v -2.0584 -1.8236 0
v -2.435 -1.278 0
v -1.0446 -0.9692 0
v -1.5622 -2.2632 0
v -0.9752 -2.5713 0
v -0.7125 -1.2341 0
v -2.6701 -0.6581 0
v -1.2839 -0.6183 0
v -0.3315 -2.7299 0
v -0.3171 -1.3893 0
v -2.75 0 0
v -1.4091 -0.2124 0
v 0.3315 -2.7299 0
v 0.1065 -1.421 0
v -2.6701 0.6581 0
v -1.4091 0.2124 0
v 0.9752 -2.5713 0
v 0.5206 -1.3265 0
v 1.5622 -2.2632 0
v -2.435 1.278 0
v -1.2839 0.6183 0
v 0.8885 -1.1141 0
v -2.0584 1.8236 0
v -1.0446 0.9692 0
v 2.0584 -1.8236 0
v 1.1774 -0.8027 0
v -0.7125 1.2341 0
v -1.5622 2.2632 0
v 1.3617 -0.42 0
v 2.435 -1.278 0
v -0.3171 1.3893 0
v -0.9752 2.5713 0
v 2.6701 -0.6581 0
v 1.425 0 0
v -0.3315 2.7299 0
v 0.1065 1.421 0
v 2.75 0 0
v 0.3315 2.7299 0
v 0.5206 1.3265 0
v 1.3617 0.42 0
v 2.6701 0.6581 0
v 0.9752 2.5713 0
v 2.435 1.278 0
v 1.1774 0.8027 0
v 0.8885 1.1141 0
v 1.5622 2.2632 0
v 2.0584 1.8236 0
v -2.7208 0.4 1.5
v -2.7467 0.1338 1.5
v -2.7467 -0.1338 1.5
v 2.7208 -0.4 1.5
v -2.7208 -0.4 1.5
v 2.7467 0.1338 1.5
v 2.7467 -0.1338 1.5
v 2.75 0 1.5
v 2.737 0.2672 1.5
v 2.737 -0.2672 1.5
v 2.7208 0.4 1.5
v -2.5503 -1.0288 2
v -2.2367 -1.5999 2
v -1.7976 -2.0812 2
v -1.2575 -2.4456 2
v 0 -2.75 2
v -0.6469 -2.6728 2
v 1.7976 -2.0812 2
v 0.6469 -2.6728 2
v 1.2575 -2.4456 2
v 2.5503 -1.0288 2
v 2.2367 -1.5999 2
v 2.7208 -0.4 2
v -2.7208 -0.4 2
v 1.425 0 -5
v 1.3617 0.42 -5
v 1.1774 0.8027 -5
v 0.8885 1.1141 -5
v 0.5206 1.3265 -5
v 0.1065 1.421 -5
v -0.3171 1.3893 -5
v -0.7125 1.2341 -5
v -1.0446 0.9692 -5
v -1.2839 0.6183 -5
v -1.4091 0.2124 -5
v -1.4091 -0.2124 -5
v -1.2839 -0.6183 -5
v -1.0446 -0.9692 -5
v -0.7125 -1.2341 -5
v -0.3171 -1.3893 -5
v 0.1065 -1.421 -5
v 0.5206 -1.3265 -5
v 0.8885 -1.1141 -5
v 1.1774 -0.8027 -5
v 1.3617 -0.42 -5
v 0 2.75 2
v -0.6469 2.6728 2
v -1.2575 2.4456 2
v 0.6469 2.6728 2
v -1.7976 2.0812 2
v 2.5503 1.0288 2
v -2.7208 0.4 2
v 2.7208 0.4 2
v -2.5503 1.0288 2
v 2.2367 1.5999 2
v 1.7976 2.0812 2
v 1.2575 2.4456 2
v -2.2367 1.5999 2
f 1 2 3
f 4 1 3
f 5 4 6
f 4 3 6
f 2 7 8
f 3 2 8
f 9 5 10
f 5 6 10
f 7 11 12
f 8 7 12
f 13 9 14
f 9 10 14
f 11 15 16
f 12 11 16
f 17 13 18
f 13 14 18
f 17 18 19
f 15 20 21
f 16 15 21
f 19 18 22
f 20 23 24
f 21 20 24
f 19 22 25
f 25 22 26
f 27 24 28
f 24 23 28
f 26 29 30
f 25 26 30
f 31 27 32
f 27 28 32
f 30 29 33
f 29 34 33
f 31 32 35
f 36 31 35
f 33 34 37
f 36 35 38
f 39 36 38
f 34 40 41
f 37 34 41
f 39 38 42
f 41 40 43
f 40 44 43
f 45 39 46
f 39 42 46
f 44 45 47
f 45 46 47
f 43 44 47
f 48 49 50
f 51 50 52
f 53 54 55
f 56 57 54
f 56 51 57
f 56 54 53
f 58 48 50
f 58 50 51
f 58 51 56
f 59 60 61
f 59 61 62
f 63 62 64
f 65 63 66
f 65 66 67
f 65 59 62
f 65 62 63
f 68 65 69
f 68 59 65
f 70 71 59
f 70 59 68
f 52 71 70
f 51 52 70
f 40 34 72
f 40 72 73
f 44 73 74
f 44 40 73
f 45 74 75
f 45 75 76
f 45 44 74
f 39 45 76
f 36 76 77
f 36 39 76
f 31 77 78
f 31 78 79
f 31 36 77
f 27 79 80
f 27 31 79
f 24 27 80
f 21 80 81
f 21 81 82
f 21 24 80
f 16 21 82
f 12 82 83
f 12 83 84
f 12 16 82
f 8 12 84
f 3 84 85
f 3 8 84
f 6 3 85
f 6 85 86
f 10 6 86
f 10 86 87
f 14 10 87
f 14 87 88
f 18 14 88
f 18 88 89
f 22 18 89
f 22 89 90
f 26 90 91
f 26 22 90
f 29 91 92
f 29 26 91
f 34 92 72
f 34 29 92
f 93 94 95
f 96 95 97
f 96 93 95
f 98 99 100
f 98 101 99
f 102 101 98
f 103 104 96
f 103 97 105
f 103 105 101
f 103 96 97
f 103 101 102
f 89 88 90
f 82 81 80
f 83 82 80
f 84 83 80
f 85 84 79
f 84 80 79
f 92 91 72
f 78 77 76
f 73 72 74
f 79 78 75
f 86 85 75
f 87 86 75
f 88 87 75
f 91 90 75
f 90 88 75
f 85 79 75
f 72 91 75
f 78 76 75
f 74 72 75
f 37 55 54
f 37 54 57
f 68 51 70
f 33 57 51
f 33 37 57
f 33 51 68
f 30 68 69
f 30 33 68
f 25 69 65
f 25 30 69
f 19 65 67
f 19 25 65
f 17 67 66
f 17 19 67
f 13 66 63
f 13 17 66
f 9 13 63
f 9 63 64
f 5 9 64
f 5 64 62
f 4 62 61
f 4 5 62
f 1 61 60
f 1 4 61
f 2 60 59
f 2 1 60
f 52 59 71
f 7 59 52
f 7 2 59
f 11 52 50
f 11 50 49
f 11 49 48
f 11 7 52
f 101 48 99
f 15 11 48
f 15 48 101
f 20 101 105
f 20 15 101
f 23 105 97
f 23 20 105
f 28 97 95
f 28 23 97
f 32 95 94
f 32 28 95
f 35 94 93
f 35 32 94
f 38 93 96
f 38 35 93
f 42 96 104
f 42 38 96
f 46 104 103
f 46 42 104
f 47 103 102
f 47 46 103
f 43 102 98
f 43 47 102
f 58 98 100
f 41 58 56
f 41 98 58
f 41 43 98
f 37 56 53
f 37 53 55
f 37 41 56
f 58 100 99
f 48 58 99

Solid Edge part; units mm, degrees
sketch "Sketch1" plane through (0, 0, 0) normal (0, 0, 1) x (1, 0, 0)
  circle A0 centre (0, 0) radius 1.425
extrude "Protrusion1" add sketch "Sketch1" against normal blind 5
sketch "Sketch2" plane through (0, 0, 0) normal (0, 0, 1) x (1, 0, 0)
  circle A0 centre (0, 0) radius 2.75
extrude "ExtrudedProtrusion_2" add sketch "Sketch2" along normal blind 2
sketch "Sketch3" plane through (0, 0, 2) normal (0, 0, 1) x (1, 0, 0)
  line L0 (3.6964, 0.4) -> (-3.6964, 0.4)
  line L1 (-3.6964, 0.4) -> (-3.6964, -0.4)
  line L2 (-3.6964, -0.4) -> (3.6964, -0.4)
  line L3 (3.6964, -0.4) -> (3.6964, 0.4)
extrude "ExtrudedCutout_1" cut sketch "Sketch3" against normal blind 0.5
properties material "Graphite"
